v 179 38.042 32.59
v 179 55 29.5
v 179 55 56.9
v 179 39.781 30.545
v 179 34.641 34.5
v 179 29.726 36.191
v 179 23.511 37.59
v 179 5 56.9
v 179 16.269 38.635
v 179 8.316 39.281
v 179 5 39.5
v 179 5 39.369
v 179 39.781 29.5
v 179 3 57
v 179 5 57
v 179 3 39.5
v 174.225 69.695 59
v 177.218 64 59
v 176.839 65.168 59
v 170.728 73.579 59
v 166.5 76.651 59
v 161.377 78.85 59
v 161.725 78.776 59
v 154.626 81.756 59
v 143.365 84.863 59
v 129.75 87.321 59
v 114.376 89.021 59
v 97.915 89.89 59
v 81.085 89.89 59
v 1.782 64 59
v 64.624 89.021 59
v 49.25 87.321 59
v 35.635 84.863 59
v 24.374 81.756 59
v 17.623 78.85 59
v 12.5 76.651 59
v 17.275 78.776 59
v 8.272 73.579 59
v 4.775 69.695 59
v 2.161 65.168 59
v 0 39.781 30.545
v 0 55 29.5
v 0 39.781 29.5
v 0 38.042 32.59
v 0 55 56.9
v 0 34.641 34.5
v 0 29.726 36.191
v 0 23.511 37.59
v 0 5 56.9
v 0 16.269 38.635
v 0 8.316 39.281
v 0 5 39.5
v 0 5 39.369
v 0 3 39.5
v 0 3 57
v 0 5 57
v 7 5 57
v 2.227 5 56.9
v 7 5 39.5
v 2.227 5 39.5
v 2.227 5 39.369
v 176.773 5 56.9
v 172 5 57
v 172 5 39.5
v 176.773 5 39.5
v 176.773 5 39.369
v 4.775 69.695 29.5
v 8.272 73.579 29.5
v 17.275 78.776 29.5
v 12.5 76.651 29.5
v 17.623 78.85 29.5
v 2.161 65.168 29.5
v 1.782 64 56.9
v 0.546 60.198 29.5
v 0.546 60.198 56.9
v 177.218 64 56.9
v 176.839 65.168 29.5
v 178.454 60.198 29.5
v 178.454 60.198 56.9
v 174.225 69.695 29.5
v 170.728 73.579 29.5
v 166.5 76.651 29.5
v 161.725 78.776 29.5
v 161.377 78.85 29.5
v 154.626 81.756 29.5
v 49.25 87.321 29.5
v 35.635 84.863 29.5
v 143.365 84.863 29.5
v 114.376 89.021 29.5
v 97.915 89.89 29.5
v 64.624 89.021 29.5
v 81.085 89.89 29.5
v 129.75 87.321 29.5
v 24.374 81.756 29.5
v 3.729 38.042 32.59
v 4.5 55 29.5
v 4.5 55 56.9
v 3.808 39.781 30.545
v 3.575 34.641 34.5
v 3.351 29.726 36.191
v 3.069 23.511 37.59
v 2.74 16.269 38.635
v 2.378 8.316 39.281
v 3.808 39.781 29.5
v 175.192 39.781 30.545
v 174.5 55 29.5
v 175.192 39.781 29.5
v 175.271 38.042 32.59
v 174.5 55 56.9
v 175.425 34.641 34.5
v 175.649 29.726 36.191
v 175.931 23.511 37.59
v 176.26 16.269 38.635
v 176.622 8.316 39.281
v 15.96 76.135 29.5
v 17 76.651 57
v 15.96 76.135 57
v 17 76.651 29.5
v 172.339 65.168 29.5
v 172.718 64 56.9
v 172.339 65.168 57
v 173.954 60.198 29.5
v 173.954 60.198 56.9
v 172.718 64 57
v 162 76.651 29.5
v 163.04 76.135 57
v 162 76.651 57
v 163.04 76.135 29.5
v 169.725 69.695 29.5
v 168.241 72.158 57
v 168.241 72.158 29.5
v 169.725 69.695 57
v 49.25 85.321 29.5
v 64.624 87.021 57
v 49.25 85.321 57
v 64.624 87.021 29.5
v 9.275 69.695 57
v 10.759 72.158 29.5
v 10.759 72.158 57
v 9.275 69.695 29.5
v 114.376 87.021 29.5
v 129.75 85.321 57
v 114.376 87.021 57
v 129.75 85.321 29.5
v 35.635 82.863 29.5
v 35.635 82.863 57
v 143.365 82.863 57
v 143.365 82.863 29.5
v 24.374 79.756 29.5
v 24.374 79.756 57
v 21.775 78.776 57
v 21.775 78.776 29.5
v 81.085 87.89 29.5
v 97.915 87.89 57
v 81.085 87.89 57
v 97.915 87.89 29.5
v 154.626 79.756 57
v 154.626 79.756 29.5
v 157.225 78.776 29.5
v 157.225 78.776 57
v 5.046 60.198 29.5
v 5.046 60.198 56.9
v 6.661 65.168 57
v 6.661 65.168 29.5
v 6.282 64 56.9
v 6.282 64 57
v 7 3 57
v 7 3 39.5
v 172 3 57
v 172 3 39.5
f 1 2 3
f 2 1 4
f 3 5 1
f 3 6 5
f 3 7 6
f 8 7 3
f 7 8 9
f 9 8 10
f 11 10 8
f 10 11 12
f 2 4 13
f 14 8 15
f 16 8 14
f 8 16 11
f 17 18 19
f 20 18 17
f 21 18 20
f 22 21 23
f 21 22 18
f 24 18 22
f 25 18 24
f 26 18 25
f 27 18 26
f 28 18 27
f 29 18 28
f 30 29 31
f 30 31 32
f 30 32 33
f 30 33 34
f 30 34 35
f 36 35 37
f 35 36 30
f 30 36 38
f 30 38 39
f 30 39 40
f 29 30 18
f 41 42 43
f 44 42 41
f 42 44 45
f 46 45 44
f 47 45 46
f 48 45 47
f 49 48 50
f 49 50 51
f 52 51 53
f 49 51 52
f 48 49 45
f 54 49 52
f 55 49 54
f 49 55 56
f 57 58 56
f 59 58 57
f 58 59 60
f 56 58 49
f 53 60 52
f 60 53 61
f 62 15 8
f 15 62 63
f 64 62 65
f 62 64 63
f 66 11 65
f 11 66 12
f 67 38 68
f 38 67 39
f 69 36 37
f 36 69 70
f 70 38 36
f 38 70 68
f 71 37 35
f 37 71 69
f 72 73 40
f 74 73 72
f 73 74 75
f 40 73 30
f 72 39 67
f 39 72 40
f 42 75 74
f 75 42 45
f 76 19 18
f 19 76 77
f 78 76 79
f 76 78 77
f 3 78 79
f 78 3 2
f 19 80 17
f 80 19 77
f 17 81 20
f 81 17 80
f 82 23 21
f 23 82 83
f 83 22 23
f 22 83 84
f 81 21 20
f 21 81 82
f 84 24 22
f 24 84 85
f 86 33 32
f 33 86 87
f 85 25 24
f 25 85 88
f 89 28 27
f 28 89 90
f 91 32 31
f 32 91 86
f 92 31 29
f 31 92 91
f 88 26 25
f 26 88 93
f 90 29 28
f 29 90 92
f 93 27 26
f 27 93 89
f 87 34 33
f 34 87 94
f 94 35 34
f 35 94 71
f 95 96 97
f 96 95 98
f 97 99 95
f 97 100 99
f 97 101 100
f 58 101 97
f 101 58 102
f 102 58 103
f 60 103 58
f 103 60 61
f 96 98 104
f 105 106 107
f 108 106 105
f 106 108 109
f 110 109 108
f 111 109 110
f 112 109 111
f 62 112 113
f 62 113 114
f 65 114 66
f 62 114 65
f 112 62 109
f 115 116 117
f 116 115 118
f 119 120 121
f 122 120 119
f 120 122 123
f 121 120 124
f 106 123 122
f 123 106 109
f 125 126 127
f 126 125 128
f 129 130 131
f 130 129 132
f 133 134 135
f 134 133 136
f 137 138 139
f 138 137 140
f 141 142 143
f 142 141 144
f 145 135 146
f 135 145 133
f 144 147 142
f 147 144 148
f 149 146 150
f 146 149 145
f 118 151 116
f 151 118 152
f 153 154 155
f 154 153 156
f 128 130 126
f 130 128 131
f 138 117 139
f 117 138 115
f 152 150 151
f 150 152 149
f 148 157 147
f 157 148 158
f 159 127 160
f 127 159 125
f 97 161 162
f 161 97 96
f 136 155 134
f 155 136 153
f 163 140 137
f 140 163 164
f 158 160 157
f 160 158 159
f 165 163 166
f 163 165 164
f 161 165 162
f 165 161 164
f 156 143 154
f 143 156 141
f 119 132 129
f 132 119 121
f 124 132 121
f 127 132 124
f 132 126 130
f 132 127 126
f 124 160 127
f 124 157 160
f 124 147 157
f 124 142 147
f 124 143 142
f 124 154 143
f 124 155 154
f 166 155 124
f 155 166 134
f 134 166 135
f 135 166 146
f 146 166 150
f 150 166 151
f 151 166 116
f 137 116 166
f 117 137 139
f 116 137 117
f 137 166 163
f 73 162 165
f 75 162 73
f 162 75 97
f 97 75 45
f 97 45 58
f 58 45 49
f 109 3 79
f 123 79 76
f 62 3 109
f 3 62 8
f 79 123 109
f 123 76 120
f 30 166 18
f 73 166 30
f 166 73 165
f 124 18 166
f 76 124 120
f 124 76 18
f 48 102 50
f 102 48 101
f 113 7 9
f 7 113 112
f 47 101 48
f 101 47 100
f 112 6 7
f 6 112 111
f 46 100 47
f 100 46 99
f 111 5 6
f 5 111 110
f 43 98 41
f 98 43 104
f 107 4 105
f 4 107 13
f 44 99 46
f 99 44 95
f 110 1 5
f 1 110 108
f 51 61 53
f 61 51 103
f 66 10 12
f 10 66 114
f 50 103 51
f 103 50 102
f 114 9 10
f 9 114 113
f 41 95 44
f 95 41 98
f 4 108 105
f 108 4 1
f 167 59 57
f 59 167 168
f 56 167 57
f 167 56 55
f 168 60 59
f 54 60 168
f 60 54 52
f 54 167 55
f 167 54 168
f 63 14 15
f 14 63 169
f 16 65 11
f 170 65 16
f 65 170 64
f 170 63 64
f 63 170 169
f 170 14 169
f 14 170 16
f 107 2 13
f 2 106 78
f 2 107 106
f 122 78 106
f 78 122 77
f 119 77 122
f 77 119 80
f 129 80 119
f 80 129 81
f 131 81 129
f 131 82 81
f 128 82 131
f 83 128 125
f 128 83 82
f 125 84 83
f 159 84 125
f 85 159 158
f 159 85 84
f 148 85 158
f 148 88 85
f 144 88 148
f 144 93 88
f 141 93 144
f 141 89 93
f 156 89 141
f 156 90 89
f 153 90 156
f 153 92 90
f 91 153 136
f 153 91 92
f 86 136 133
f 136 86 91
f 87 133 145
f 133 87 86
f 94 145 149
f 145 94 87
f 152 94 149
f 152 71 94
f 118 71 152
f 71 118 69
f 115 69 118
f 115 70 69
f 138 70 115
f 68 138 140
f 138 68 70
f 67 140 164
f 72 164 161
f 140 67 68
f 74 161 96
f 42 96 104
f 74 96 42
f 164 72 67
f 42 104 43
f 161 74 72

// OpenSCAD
mw=175;
r=25;
d=55;
cw=170;
wd=mw-cw;

t=2;

h=55+t*2;
w=mw+t*2;

//mount();

intersection() {
  mount();
  translate([0,0,h/2]) cube([1000,1000,h/2]);
}


module mount() {
  difference() {
    union() {
      translate([0,5,0]) cube([w,d-5,h]);
      translate([r,d,0]) cylinder(r=r,h=h);
      translate([w-r,d,0]) cylinder(r=r,h=h);
      translate([w/2,d+15,0]) scale([(cw-9)/20/2,1,1]) cylinder(r=20,h=h);
    }
    translate([t,0,t]) cutout();
    translate([w/2-160/2,40,-1]) cube([160,30,t+2]);
    translate([-1,-1,-1]) cube([w+2,30,t+1.01]);
    translate([-1,-1,h-t-0.1]) cube([w+2,65,t+1.01]);
    translate([0,0,h/2]) rotate([0,90,0]) translate([0,0,-10]) scale([1,4,1]) cylinder(r=10,h=1000);
    translate([w/2,20,-1]) cylinder(r=15,h=5);
  }

  fw=5;
  translate([0,3,t]) cube([fw+t,t,17.5]);
  translate([0,3,t+37.5]) cube([fw+t,t,17.5]);
  translate([w-fw-t,3,t]) cube([fw+t,t,17.5]);
  translate([w-fw-t,3,t+37.5]) cube([fw+t,t,17.5]);
}

module cutout() {
  h=h-t*2;
  hull() {
    translate([0,-1,0]) cube([mw,1,h]);

    translate([r+wd/2,d,0]) cylinder(r=r,h=h);
    translate([-r+wd/2+cw,d,0]) cylinder(r=r,h=h);
    translate([mw/2,d+13,0]) scale([(cw-9)/20/2,1,1]) cylinder(r=20,h=h);
  }
}
